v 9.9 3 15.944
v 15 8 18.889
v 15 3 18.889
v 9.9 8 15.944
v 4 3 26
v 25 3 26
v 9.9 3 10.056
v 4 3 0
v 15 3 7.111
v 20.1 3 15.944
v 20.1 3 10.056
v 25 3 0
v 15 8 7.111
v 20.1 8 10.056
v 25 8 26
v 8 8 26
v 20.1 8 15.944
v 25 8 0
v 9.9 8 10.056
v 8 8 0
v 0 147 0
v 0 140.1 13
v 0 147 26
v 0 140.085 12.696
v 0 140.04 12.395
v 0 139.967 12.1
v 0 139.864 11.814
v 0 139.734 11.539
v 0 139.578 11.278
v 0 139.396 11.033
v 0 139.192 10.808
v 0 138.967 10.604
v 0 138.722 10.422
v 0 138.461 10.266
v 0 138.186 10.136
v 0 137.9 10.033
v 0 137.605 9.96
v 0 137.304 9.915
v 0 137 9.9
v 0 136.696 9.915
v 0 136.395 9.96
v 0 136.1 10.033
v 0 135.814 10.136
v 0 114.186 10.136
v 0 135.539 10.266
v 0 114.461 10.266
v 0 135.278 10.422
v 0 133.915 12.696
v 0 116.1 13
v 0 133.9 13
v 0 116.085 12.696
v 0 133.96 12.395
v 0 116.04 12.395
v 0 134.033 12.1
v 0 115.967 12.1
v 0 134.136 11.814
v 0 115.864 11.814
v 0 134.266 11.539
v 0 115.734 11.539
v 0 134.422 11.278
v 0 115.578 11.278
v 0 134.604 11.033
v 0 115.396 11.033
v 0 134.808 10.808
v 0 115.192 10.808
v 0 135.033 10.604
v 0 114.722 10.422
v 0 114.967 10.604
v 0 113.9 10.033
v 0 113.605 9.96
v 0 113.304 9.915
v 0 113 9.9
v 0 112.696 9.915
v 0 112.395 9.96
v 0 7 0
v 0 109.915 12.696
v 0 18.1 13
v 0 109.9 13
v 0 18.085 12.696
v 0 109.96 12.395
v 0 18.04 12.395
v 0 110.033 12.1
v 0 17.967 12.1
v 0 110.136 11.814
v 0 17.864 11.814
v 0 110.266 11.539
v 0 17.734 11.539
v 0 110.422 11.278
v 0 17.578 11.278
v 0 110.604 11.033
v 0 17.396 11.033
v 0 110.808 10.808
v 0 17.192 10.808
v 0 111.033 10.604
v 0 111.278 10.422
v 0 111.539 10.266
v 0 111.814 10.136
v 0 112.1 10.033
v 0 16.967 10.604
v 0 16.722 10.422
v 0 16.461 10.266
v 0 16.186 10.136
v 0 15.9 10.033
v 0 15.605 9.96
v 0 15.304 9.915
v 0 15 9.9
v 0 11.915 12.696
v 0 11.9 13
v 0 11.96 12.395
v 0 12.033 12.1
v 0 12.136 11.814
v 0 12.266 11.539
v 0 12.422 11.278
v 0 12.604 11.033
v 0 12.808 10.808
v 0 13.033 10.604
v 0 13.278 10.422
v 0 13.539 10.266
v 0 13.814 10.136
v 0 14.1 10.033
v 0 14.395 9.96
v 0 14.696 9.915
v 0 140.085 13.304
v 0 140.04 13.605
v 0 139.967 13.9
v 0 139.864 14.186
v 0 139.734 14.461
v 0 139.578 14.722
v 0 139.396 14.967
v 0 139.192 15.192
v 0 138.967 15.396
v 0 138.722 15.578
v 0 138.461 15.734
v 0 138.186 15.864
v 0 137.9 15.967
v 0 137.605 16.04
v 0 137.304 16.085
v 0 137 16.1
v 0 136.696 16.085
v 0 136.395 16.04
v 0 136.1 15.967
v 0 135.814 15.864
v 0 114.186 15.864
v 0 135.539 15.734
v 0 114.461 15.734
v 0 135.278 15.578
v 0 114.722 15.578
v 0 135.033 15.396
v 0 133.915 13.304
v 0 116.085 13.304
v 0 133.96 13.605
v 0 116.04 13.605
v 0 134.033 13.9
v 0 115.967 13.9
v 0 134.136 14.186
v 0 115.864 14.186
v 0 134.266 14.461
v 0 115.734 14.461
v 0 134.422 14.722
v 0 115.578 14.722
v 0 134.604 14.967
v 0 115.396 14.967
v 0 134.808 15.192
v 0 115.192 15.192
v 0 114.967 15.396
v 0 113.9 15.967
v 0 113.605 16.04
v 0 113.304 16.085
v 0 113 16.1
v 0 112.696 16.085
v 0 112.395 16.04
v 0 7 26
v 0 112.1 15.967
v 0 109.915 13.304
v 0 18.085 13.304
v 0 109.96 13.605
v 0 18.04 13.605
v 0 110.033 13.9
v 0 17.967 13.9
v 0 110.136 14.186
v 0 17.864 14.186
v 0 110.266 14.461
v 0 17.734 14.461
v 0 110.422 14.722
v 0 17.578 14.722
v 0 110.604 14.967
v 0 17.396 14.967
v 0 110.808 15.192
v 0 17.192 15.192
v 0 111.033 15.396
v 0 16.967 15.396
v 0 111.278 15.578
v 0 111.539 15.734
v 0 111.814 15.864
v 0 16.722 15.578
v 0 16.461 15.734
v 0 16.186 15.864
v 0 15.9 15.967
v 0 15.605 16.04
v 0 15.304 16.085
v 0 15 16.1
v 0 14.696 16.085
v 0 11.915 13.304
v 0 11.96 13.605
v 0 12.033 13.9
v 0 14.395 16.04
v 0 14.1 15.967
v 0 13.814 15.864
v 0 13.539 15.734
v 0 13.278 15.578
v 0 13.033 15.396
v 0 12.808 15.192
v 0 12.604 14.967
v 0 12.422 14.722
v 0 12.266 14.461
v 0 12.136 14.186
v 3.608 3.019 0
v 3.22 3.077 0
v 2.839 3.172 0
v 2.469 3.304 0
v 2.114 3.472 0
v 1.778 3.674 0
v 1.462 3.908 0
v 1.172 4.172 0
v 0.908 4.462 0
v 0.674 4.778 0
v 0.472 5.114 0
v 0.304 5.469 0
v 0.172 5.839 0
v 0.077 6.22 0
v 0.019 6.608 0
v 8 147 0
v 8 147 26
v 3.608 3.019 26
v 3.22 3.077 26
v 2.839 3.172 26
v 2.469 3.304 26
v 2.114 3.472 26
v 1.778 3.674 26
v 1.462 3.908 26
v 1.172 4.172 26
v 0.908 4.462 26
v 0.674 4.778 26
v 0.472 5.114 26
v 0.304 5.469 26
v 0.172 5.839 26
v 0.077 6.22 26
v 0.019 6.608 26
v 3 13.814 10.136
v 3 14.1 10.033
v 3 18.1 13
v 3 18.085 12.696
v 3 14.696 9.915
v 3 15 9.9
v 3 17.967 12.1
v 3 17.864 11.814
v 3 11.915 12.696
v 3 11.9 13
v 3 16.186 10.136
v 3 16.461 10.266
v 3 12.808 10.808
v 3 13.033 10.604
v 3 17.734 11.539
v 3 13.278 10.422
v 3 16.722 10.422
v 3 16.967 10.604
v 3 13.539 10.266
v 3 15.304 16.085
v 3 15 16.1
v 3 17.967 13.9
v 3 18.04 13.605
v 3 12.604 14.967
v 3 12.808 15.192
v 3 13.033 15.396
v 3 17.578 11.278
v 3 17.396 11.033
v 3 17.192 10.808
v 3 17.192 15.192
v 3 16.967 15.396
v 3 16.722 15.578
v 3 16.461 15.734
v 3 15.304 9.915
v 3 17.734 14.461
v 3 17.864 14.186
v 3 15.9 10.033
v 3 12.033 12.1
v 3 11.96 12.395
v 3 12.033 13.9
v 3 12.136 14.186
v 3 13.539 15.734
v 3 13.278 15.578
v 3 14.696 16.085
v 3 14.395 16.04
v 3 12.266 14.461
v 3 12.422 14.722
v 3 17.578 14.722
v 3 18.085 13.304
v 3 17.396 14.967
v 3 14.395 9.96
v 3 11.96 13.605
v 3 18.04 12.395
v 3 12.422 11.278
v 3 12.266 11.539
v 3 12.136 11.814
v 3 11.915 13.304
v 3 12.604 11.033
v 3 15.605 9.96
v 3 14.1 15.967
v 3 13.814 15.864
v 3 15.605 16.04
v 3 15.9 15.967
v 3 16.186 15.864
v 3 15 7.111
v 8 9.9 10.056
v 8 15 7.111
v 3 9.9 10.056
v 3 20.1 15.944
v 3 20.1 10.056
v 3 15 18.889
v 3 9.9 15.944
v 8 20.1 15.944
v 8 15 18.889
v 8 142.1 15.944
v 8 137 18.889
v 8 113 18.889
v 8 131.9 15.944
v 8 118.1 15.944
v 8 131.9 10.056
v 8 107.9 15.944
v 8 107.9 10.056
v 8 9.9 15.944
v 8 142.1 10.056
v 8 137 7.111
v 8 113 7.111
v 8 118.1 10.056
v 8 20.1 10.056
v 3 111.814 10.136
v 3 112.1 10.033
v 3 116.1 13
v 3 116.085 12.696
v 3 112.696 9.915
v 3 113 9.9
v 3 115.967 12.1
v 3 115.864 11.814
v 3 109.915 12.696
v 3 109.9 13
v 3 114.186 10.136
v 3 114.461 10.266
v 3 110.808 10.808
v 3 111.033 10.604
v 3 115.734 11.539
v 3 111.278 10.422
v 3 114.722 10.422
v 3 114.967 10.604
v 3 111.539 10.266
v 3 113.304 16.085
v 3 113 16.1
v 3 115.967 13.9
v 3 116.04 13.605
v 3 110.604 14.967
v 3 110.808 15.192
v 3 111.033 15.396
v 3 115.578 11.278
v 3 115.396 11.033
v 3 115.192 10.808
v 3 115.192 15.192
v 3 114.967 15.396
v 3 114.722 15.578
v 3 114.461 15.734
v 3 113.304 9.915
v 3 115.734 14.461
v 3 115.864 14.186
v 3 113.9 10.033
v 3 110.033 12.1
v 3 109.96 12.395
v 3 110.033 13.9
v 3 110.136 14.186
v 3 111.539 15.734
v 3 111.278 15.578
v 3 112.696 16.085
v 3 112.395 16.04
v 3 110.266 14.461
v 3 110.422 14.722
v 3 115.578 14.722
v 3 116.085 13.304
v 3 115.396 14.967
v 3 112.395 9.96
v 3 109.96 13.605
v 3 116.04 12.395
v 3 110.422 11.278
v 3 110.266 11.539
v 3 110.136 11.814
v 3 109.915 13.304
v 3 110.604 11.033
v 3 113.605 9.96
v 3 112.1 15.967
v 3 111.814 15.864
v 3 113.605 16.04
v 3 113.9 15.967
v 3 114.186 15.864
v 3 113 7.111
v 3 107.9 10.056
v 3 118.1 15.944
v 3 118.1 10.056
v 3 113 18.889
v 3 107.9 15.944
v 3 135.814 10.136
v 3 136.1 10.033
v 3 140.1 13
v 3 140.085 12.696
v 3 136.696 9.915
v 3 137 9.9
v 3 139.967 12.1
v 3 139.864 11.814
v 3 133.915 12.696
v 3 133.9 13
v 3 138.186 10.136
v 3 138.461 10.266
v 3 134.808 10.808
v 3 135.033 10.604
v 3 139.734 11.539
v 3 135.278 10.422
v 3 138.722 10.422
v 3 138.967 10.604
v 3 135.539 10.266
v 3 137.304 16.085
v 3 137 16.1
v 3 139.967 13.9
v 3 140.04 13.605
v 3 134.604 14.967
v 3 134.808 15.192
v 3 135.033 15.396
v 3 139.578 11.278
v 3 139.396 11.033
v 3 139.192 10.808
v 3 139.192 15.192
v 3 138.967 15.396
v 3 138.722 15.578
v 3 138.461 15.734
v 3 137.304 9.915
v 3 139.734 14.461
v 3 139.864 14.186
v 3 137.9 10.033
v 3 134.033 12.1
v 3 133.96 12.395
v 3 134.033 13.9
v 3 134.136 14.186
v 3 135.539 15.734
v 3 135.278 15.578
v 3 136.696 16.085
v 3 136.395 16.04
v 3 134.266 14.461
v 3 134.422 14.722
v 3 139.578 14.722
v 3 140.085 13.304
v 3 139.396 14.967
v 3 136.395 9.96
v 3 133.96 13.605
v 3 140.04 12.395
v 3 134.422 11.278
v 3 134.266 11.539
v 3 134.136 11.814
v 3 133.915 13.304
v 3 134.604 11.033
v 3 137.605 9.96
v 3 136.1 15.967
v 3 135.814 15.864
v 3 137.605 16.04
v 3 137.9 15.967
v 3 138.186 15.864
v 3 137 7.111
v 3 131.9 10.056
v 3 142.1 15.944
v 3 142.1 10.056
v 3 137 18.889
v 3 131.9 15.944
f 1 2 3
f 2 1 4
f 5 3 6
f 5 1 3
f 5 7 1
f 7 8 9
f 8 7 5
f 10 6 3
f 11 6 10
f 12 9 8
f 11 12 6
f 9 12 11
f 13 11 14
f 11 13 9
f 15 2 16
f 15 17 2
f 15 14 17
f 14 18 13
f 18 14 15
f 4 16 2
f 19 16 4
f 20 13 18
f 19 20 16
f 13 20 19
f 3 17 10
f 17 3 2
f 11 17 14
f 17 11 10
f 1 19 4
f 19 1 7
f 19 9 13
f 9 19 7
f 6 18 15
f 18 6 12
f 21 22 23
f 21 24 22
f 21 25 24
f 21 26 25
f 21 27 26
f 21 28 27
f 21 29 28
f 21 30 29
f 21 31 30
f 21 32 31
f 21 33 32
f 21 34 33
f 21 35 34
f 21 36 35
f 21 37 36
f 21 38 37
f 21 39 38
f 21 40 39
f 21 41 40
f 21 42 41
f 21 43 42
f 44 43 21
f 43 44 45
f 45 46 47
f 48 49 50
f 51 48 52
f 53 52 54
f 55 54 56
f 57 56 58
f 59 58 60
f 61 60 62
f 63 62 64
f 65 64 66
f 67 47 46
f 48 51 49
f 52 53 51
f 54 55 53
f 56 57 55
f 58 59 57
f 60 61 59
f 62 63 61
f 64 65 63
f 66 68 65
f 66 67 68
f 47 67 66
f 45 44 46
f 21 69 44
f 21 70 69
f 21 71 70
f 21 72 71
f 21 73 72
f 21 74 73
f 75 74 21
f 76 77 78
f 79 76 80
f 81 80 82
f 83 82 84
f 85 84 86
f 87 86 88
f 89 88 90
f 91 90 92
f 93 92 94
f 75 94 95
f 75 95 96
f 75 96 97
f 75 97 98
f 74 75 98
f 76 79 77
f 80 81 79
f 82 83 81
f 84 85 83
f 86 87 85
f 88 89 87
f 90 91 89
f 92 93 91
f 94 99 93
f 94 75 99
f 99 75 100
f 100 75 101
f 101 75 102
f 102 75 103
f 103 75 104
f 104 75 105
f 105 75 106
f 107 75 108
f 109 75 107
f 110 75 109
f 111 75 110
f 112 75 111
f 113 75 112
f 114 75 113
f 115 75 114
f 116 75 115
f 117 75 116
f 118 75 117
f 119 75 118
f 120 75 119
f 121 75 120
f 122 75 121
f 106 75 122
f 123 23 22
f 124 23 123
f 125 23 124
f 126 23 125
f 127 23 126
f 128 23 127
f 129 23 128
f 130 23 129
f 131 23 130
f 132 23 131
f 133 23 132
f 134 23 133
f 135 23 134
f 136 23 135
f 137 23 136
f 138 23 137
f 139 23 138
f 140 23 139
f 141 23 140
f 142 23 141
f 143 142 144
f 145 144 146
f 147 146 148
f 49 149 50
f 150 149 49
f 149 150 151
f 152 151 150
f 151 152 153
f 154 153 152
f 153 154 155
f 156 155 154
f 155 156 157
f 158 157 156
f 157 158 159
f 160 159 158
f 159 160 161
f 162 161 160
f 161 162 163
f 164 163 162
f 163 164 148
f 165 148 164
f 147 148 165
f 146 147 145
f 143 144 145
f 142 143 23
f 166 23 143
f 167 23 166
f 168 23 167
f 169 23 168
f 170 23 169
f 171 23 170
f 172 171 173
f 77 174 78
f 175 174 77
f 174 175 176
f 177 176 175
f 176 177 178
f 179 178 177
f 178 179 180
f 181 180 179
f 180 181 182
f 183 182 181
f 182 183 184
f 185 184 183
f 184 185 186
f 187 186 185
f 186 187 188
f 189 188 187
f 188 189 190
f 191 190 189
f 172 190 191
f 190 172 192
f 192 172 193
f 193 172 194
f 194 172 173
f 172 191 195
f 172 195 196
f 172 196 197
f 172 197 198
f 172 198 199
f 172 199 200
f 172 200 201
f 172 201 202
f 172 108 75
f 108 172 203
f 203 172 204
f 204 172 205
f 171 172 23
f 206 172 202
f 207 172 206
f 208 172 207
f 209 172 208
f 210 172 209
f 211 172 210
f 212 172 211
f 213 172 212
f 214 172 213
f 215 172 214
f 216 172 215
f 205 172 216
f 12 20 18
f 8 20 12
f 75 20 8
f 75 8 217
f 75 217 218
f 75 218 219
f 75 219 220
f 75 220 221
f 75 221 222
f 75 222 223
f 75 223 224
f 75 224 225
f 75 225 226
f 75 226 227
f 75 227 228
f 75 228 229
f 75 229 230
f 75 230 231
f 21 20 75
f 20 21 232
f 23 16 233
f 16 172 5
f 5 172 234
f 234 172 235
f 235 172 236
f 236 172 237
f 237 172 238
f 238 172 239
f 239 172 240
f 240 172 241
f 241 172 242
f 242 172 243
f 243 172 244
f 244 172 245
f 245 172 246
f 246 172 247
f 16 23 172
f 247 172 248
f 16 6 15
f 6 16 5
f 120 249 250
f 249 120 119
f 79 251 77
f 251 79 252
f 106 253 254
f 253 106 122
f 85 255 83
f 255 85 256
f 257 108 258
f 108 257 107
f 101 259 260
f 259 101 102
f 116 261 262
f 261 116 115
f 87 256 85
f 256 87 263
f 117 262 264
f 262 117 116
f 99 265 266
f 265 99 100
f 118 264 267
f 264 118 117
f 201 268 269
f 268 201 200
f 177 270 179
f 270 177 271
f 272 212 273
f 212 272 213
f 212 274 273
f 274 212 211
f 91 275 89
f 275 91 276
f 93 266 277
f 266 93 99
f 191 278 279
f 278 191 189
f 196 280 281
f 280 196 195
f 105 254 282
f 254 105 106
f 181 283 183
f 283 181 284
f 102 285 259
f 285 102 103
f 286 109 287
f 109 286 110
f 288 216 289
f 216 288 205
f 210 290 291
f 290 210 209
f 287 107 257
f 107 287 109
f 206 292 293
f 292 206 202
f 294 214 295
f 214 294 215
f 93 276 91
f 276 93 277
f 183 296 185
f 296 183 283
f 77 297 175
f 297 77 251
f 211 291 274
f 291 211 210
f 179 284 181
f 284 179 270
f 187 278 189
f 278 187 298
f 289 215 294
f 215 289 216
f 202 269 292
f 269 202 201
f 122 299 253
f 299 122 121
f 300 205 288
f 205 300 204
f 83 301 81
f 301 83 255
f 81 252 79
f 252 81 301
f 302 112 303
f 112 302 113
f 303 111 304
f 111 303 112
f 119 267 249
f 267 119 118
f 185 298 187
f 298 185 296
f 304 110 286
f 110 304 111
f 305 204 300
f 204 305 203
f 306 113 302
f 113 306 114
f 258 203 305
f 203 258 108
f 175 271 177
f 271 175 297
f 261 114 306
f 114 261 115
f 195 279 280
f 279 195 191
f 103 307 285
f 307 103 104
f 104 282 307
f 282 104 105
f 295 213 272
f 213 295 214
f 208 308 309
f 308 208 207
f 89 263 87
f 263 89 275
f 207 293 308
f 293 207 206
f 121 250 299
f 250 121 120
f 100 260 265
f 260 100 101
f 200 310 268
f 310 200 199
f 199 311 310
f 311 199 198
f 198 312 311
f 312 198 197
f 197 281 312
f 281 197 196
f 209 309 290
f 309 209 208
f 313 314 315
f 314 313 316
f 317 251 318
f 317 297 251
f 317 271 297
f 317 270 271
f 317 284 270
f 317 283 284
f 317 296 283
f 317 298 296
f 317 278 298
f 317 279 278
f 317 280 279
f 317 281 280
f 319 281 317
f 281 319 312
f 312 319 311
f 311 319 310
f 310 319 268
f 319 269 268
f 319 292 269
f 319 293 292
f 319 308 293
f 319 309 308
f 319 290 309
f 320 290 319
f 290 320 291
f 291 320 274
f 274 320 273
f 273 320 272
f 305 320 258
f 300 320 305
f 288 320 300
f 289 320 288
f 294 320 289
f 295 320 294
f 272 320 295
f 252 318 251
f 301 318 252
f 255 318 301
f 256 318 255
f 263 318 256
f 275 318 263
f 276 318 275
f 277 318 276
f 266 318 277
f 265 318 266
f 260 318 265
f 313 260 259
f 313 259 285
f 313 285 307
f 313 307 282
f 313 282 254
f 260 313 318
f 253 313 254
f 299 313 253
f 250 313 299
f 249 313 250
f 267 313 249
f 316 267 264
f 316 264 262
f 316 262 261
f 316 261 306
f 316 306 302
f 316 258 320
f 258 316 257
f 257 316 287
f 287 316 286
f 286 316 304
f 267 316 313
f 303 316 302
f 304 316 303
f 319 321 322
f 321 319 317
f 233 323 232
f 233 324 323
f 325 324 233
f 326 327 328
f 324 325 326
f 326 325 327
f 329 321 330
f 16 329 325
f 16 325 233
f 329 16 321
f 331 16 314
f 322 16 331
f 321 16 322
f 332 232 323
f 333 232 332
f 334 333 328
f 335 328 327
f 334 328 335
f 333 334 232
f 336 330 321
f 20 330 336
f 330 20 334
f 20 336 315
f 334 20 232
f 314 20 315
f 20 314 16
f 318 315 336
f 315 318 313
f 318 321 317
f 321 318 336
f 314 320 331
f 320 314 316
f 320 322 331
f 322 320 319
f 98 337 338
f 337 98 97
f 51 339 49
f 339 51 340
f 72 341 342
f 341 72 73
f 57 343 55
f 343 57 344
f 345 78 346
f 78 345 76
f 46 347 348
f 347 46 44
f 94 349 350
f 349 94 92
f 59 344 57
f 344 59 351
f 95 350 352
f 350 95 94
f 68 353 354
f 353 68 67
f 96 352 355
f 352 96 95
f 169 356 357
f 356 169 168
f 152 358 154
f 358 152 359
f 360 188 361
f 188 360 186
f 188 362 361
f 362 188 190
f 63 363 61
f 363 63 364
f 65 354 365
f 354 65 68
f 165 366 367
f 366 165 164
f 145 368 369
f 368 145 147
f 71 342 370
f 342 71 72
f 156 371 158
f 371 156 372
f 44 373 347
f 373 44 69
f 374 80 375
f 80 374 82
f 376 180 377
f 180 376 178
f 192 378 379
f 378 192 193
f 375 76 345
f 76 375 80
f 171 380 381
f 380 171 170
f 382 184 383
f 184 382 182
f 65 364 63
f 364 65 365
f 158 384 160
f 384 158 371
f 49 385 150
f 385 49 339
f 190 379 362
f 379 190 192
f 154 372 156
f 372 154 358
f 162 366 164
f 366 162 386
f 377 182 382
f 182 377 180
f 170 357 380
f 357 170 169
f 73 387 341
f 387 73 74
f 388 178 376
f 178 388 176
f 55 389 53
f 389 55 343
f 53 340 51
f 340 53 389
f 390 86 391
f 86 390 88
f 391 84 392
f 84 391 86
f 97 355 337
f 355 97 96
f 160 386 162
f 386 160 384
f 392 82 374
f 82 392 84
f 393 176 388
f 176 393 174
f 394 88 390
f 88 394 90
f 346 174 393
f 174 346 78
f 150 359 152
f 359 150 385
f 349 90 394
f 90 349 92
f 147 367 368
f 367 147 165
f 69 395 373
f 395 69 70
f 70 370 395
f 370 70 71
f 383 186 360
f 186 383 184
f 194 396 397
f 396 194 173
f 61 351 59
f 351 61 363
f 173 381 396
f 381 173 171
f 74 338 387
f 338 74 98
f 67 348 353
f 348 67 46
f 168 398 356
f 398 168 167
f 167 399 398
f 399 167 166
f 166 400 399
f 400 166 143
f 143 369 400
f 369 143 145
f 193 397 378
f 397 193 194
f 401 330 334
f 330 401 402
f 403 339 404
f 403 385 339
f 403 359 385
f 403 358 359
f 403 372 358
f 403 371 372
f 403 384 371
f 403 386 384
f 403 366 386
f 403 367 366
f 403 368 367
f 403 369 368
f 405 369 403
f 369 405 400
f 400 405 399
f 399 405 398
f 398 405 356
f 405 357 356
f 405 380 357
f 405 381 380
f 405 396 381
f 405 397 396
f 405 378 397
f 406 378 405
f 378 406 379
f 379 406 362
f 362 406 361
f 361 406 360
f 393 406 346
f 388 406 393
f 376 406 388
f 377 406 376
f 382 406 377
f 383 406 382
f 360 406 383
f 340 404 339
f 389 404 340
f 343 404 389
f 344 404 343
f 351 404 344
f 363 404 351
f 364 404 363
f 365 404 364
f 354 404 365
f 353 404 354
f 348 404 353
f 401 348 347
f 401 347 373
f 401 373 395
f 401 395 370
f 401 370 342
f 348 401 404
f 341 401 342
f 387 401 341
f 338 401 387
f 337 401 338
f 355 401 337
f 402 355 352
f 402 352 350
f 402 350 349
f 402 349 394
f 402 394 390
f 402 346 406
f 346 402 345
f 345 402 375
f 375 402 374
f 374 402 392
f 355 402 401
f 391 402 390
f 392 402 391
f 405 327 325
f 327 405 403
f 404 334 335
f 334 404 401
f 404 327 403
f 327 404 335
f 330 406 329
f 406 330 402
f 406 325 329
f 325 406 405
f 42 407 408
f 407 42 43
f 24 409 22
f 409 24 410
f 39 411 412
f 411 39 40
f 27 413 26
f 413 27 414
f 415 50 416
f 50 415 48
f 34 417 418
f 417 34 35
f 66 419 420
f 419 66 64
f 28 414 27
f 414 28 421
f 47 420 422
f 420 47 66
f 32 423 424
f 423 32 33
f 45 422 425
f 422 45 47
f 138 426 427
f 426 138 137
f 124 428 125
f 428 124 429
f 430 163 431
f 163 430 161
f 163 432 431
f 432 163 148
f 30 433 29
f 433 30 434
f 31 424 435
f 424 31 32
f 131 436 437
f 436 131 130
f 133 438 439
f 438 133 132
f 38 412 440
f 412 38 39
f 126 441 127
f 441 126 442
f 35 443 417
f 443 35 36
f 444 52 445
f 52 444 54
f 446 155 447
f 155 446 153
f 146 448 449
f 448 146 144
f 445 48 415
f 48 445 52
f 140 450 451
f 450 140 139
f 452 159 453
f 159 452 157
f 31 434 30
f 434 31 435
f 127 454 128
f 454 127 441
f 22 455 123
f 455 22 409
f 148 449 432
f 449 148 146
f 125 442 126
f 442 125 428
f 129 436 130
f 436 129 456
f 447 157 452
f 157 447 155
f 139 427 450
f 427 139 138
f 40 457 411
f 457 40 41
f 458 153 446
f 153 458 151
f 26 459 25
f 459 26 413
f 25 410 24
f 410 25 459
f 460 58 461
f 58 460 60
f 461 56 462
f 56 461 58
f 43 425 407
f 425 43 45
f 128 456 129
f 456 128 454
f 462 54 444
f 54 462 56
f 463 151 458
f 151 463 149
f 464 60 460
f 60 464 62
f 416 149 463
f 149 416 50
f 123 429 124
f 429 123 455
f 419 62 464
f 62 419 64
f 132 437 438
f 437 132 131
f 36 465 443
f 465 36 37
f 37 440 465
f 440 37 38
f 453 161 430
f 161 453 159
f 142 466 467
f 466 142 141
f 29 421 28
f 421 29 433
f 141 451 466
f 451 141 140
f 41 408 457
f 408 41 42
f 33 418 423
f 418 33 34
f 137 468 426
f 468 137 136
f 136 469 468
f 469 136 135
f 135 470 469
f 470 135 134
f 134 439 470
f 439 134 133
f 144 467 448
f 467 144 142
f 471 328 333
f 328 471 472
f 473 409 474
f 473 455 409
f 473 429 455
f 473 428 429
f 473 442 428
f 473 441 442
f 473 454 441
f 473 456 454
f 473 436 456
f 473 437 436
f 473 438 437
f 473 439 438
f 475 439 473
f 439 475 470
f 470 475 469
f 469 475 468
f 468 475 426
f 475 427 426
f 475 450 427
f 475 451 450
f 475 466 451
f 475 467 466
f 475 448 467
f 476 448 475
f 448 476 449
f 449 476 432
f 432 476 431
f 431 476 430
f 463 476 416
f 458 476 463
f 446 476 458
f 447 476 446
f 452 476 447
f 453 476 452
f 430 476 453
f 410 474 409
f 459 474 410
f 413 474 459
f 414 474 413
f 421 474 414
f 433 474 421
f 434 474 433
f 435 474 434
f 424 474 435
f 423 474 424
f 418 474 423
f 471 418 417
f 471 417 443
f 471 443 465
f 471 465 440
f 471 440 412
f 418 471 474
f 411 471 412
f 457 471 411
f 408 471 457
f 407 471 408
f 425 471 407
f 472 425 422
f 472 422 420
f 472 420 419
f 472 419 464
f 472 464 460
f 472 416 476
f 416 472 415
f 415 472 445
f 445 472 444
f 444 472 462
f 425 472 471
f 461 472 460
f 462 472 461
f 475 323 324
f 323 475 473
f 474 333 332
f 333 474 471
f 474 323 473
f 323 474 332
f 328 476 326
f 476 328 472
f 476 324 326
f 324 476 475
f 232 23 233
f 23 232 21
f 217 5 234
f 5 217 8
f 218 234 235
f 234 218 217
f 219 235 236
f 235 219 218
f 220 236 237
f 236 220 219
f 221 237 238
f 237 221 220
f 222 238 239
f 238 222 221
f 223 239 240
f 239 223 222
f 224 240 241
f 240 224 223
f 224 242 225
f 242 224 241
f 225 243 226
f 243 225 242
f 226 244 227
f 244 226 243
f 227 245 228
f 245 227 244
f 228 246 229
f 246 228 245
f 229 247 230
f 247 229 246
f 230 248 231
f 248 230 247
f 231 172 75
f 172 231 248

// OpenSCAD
// file: ../../../modules/steel_rack.scad
use <bolts.scad>;

bolt_edge_offset = 15;
bolt_positions = [
  bolt_edge_offset,
  bolt_edge_offset + 98,
  bolt_edge_offset + 98 + 24,
];

module bolt_and_nut(y, h) {
  nut_thickness = 5;
  translate([0, y, h / 2])
    m6_bolt_hole(h + 1, center = true);
  translate([0, y, h - nut_thickness / 2])
    rotate([0, 0, 90])
    m6_nut_trap(nut_thickness, center = true);
}

module long_bar(w, y, h) {
  difference() {
    translate([w / 2, y / 2, h / 2])
      cube([w, y, h], center = true);

    for (x = bolt_positions) {
      translate([x, 0, 0])
        bolt_and_nut(y / 2, h);
    }
  }
}

module short_bar(w, y, h) {
  difference() {
    translate([w / 2, y / 2, h / 2])
      cube([w, y, h], center = true);

    translate([bolt_positions[0], 0, 0])
      bolt_and_nut(y / 2, h);
  }
}

module fillet_profile(r, h) {
  linear_extrude(height = h, center = true)
    difference() {
      square([r, r]);
      circle(r = r, $fn = 64);
    }
}
// file: ../../../modules/bolts.scad
module nut_trap(d, h, center = true) {
  linear_extrude(height = h, center = center)
  circle(d = d / cos(30), $fn = 6);
}

module bolt_hole(d, h, center = true) {
  linear_extrude(height = h, center = center)
  circle(d = d, $fn = 64);
}

// Hex holes for self-tapping (nominal - 0.2mm)
module hex_hole(flat_d, h) {
  linear_extrude(height = h, center = true)
  circle(d = flat_d / cos(30), $fn = 6);
}

module m3_bolt_hexhole(h) {
  rotate([0, 0, 90]) hex_hole(flat_d = 2.8, h = h);
}

module m4_bolt_hexhole(h) {
  rotate([0, 0, 90]) hex_hole(flat_d = 3.8, h = h);
}

module m6_bolt_hexhole(h) {
  rotate([0, 0, 90]) hex_hole(flat_d = 5.8, h = h);
}

module m8_bolt_hexhole(h) {
  rotate([0, 0, 90]) hex_hole(flat_d = 7.8, h = h);
}

// M3
module m3_bolt_hole(h, center = false) { bolt_hole(d = 3.4, h = h, center = center); }
module m3_nut_trap(h, center = false) { nut_trap(d = 5.7, h = h, center = center); }

// M4
module m4_bolt_hole(h, center = false) { bolt_hole(d = 4.4, h = h, center = center); }
module m4_nut_trap(h, center = false) { nut_trap(d = 7.5, h = h, center = center); }

// M6
module m6_bolt_hole(h, center = false) { bolt_hole(d = 6.2, h = h, center = center); }
module m6_nut_trap(h, center = false) { nut_trap(d = 10.2, h = h, center = center); }

// M8
module m8_bolt_hole(h, center = false) { bolt_hole(d = 8.4, h = h, center = center); }
module m8_nut_trap(h, center = false) { nut_trap(d = 13.3, h = h, center = center); }
// main file
use <../../../modules/bolts.scad>;
use <../../../modules/steel_rack.scad>;

width = 147;
height = 26;
deps = 8;
radius = 4;

difference() {
  union() {
    translate([0, 0, height])
      rotate([90, 180, 180])
      short_bar(25, height, deps);

    translate([0, 0, 0])
      rotate([90, 0, 90])
      long_bar(width, height, deps);
  }

  // Offset to align with the 6mm wall clearance cut
  translate([deps / 2, deps / 2 + 3, 0])
    rotate([0, 0, 180])
    fillet_profile(radius, height * 2 + 1);

  // Cut 6mm clearance to avoid wall interference
  translate([deps / 2, 0, 0])
    cube([50, 6, height * 2 + 1], center = true);
}
